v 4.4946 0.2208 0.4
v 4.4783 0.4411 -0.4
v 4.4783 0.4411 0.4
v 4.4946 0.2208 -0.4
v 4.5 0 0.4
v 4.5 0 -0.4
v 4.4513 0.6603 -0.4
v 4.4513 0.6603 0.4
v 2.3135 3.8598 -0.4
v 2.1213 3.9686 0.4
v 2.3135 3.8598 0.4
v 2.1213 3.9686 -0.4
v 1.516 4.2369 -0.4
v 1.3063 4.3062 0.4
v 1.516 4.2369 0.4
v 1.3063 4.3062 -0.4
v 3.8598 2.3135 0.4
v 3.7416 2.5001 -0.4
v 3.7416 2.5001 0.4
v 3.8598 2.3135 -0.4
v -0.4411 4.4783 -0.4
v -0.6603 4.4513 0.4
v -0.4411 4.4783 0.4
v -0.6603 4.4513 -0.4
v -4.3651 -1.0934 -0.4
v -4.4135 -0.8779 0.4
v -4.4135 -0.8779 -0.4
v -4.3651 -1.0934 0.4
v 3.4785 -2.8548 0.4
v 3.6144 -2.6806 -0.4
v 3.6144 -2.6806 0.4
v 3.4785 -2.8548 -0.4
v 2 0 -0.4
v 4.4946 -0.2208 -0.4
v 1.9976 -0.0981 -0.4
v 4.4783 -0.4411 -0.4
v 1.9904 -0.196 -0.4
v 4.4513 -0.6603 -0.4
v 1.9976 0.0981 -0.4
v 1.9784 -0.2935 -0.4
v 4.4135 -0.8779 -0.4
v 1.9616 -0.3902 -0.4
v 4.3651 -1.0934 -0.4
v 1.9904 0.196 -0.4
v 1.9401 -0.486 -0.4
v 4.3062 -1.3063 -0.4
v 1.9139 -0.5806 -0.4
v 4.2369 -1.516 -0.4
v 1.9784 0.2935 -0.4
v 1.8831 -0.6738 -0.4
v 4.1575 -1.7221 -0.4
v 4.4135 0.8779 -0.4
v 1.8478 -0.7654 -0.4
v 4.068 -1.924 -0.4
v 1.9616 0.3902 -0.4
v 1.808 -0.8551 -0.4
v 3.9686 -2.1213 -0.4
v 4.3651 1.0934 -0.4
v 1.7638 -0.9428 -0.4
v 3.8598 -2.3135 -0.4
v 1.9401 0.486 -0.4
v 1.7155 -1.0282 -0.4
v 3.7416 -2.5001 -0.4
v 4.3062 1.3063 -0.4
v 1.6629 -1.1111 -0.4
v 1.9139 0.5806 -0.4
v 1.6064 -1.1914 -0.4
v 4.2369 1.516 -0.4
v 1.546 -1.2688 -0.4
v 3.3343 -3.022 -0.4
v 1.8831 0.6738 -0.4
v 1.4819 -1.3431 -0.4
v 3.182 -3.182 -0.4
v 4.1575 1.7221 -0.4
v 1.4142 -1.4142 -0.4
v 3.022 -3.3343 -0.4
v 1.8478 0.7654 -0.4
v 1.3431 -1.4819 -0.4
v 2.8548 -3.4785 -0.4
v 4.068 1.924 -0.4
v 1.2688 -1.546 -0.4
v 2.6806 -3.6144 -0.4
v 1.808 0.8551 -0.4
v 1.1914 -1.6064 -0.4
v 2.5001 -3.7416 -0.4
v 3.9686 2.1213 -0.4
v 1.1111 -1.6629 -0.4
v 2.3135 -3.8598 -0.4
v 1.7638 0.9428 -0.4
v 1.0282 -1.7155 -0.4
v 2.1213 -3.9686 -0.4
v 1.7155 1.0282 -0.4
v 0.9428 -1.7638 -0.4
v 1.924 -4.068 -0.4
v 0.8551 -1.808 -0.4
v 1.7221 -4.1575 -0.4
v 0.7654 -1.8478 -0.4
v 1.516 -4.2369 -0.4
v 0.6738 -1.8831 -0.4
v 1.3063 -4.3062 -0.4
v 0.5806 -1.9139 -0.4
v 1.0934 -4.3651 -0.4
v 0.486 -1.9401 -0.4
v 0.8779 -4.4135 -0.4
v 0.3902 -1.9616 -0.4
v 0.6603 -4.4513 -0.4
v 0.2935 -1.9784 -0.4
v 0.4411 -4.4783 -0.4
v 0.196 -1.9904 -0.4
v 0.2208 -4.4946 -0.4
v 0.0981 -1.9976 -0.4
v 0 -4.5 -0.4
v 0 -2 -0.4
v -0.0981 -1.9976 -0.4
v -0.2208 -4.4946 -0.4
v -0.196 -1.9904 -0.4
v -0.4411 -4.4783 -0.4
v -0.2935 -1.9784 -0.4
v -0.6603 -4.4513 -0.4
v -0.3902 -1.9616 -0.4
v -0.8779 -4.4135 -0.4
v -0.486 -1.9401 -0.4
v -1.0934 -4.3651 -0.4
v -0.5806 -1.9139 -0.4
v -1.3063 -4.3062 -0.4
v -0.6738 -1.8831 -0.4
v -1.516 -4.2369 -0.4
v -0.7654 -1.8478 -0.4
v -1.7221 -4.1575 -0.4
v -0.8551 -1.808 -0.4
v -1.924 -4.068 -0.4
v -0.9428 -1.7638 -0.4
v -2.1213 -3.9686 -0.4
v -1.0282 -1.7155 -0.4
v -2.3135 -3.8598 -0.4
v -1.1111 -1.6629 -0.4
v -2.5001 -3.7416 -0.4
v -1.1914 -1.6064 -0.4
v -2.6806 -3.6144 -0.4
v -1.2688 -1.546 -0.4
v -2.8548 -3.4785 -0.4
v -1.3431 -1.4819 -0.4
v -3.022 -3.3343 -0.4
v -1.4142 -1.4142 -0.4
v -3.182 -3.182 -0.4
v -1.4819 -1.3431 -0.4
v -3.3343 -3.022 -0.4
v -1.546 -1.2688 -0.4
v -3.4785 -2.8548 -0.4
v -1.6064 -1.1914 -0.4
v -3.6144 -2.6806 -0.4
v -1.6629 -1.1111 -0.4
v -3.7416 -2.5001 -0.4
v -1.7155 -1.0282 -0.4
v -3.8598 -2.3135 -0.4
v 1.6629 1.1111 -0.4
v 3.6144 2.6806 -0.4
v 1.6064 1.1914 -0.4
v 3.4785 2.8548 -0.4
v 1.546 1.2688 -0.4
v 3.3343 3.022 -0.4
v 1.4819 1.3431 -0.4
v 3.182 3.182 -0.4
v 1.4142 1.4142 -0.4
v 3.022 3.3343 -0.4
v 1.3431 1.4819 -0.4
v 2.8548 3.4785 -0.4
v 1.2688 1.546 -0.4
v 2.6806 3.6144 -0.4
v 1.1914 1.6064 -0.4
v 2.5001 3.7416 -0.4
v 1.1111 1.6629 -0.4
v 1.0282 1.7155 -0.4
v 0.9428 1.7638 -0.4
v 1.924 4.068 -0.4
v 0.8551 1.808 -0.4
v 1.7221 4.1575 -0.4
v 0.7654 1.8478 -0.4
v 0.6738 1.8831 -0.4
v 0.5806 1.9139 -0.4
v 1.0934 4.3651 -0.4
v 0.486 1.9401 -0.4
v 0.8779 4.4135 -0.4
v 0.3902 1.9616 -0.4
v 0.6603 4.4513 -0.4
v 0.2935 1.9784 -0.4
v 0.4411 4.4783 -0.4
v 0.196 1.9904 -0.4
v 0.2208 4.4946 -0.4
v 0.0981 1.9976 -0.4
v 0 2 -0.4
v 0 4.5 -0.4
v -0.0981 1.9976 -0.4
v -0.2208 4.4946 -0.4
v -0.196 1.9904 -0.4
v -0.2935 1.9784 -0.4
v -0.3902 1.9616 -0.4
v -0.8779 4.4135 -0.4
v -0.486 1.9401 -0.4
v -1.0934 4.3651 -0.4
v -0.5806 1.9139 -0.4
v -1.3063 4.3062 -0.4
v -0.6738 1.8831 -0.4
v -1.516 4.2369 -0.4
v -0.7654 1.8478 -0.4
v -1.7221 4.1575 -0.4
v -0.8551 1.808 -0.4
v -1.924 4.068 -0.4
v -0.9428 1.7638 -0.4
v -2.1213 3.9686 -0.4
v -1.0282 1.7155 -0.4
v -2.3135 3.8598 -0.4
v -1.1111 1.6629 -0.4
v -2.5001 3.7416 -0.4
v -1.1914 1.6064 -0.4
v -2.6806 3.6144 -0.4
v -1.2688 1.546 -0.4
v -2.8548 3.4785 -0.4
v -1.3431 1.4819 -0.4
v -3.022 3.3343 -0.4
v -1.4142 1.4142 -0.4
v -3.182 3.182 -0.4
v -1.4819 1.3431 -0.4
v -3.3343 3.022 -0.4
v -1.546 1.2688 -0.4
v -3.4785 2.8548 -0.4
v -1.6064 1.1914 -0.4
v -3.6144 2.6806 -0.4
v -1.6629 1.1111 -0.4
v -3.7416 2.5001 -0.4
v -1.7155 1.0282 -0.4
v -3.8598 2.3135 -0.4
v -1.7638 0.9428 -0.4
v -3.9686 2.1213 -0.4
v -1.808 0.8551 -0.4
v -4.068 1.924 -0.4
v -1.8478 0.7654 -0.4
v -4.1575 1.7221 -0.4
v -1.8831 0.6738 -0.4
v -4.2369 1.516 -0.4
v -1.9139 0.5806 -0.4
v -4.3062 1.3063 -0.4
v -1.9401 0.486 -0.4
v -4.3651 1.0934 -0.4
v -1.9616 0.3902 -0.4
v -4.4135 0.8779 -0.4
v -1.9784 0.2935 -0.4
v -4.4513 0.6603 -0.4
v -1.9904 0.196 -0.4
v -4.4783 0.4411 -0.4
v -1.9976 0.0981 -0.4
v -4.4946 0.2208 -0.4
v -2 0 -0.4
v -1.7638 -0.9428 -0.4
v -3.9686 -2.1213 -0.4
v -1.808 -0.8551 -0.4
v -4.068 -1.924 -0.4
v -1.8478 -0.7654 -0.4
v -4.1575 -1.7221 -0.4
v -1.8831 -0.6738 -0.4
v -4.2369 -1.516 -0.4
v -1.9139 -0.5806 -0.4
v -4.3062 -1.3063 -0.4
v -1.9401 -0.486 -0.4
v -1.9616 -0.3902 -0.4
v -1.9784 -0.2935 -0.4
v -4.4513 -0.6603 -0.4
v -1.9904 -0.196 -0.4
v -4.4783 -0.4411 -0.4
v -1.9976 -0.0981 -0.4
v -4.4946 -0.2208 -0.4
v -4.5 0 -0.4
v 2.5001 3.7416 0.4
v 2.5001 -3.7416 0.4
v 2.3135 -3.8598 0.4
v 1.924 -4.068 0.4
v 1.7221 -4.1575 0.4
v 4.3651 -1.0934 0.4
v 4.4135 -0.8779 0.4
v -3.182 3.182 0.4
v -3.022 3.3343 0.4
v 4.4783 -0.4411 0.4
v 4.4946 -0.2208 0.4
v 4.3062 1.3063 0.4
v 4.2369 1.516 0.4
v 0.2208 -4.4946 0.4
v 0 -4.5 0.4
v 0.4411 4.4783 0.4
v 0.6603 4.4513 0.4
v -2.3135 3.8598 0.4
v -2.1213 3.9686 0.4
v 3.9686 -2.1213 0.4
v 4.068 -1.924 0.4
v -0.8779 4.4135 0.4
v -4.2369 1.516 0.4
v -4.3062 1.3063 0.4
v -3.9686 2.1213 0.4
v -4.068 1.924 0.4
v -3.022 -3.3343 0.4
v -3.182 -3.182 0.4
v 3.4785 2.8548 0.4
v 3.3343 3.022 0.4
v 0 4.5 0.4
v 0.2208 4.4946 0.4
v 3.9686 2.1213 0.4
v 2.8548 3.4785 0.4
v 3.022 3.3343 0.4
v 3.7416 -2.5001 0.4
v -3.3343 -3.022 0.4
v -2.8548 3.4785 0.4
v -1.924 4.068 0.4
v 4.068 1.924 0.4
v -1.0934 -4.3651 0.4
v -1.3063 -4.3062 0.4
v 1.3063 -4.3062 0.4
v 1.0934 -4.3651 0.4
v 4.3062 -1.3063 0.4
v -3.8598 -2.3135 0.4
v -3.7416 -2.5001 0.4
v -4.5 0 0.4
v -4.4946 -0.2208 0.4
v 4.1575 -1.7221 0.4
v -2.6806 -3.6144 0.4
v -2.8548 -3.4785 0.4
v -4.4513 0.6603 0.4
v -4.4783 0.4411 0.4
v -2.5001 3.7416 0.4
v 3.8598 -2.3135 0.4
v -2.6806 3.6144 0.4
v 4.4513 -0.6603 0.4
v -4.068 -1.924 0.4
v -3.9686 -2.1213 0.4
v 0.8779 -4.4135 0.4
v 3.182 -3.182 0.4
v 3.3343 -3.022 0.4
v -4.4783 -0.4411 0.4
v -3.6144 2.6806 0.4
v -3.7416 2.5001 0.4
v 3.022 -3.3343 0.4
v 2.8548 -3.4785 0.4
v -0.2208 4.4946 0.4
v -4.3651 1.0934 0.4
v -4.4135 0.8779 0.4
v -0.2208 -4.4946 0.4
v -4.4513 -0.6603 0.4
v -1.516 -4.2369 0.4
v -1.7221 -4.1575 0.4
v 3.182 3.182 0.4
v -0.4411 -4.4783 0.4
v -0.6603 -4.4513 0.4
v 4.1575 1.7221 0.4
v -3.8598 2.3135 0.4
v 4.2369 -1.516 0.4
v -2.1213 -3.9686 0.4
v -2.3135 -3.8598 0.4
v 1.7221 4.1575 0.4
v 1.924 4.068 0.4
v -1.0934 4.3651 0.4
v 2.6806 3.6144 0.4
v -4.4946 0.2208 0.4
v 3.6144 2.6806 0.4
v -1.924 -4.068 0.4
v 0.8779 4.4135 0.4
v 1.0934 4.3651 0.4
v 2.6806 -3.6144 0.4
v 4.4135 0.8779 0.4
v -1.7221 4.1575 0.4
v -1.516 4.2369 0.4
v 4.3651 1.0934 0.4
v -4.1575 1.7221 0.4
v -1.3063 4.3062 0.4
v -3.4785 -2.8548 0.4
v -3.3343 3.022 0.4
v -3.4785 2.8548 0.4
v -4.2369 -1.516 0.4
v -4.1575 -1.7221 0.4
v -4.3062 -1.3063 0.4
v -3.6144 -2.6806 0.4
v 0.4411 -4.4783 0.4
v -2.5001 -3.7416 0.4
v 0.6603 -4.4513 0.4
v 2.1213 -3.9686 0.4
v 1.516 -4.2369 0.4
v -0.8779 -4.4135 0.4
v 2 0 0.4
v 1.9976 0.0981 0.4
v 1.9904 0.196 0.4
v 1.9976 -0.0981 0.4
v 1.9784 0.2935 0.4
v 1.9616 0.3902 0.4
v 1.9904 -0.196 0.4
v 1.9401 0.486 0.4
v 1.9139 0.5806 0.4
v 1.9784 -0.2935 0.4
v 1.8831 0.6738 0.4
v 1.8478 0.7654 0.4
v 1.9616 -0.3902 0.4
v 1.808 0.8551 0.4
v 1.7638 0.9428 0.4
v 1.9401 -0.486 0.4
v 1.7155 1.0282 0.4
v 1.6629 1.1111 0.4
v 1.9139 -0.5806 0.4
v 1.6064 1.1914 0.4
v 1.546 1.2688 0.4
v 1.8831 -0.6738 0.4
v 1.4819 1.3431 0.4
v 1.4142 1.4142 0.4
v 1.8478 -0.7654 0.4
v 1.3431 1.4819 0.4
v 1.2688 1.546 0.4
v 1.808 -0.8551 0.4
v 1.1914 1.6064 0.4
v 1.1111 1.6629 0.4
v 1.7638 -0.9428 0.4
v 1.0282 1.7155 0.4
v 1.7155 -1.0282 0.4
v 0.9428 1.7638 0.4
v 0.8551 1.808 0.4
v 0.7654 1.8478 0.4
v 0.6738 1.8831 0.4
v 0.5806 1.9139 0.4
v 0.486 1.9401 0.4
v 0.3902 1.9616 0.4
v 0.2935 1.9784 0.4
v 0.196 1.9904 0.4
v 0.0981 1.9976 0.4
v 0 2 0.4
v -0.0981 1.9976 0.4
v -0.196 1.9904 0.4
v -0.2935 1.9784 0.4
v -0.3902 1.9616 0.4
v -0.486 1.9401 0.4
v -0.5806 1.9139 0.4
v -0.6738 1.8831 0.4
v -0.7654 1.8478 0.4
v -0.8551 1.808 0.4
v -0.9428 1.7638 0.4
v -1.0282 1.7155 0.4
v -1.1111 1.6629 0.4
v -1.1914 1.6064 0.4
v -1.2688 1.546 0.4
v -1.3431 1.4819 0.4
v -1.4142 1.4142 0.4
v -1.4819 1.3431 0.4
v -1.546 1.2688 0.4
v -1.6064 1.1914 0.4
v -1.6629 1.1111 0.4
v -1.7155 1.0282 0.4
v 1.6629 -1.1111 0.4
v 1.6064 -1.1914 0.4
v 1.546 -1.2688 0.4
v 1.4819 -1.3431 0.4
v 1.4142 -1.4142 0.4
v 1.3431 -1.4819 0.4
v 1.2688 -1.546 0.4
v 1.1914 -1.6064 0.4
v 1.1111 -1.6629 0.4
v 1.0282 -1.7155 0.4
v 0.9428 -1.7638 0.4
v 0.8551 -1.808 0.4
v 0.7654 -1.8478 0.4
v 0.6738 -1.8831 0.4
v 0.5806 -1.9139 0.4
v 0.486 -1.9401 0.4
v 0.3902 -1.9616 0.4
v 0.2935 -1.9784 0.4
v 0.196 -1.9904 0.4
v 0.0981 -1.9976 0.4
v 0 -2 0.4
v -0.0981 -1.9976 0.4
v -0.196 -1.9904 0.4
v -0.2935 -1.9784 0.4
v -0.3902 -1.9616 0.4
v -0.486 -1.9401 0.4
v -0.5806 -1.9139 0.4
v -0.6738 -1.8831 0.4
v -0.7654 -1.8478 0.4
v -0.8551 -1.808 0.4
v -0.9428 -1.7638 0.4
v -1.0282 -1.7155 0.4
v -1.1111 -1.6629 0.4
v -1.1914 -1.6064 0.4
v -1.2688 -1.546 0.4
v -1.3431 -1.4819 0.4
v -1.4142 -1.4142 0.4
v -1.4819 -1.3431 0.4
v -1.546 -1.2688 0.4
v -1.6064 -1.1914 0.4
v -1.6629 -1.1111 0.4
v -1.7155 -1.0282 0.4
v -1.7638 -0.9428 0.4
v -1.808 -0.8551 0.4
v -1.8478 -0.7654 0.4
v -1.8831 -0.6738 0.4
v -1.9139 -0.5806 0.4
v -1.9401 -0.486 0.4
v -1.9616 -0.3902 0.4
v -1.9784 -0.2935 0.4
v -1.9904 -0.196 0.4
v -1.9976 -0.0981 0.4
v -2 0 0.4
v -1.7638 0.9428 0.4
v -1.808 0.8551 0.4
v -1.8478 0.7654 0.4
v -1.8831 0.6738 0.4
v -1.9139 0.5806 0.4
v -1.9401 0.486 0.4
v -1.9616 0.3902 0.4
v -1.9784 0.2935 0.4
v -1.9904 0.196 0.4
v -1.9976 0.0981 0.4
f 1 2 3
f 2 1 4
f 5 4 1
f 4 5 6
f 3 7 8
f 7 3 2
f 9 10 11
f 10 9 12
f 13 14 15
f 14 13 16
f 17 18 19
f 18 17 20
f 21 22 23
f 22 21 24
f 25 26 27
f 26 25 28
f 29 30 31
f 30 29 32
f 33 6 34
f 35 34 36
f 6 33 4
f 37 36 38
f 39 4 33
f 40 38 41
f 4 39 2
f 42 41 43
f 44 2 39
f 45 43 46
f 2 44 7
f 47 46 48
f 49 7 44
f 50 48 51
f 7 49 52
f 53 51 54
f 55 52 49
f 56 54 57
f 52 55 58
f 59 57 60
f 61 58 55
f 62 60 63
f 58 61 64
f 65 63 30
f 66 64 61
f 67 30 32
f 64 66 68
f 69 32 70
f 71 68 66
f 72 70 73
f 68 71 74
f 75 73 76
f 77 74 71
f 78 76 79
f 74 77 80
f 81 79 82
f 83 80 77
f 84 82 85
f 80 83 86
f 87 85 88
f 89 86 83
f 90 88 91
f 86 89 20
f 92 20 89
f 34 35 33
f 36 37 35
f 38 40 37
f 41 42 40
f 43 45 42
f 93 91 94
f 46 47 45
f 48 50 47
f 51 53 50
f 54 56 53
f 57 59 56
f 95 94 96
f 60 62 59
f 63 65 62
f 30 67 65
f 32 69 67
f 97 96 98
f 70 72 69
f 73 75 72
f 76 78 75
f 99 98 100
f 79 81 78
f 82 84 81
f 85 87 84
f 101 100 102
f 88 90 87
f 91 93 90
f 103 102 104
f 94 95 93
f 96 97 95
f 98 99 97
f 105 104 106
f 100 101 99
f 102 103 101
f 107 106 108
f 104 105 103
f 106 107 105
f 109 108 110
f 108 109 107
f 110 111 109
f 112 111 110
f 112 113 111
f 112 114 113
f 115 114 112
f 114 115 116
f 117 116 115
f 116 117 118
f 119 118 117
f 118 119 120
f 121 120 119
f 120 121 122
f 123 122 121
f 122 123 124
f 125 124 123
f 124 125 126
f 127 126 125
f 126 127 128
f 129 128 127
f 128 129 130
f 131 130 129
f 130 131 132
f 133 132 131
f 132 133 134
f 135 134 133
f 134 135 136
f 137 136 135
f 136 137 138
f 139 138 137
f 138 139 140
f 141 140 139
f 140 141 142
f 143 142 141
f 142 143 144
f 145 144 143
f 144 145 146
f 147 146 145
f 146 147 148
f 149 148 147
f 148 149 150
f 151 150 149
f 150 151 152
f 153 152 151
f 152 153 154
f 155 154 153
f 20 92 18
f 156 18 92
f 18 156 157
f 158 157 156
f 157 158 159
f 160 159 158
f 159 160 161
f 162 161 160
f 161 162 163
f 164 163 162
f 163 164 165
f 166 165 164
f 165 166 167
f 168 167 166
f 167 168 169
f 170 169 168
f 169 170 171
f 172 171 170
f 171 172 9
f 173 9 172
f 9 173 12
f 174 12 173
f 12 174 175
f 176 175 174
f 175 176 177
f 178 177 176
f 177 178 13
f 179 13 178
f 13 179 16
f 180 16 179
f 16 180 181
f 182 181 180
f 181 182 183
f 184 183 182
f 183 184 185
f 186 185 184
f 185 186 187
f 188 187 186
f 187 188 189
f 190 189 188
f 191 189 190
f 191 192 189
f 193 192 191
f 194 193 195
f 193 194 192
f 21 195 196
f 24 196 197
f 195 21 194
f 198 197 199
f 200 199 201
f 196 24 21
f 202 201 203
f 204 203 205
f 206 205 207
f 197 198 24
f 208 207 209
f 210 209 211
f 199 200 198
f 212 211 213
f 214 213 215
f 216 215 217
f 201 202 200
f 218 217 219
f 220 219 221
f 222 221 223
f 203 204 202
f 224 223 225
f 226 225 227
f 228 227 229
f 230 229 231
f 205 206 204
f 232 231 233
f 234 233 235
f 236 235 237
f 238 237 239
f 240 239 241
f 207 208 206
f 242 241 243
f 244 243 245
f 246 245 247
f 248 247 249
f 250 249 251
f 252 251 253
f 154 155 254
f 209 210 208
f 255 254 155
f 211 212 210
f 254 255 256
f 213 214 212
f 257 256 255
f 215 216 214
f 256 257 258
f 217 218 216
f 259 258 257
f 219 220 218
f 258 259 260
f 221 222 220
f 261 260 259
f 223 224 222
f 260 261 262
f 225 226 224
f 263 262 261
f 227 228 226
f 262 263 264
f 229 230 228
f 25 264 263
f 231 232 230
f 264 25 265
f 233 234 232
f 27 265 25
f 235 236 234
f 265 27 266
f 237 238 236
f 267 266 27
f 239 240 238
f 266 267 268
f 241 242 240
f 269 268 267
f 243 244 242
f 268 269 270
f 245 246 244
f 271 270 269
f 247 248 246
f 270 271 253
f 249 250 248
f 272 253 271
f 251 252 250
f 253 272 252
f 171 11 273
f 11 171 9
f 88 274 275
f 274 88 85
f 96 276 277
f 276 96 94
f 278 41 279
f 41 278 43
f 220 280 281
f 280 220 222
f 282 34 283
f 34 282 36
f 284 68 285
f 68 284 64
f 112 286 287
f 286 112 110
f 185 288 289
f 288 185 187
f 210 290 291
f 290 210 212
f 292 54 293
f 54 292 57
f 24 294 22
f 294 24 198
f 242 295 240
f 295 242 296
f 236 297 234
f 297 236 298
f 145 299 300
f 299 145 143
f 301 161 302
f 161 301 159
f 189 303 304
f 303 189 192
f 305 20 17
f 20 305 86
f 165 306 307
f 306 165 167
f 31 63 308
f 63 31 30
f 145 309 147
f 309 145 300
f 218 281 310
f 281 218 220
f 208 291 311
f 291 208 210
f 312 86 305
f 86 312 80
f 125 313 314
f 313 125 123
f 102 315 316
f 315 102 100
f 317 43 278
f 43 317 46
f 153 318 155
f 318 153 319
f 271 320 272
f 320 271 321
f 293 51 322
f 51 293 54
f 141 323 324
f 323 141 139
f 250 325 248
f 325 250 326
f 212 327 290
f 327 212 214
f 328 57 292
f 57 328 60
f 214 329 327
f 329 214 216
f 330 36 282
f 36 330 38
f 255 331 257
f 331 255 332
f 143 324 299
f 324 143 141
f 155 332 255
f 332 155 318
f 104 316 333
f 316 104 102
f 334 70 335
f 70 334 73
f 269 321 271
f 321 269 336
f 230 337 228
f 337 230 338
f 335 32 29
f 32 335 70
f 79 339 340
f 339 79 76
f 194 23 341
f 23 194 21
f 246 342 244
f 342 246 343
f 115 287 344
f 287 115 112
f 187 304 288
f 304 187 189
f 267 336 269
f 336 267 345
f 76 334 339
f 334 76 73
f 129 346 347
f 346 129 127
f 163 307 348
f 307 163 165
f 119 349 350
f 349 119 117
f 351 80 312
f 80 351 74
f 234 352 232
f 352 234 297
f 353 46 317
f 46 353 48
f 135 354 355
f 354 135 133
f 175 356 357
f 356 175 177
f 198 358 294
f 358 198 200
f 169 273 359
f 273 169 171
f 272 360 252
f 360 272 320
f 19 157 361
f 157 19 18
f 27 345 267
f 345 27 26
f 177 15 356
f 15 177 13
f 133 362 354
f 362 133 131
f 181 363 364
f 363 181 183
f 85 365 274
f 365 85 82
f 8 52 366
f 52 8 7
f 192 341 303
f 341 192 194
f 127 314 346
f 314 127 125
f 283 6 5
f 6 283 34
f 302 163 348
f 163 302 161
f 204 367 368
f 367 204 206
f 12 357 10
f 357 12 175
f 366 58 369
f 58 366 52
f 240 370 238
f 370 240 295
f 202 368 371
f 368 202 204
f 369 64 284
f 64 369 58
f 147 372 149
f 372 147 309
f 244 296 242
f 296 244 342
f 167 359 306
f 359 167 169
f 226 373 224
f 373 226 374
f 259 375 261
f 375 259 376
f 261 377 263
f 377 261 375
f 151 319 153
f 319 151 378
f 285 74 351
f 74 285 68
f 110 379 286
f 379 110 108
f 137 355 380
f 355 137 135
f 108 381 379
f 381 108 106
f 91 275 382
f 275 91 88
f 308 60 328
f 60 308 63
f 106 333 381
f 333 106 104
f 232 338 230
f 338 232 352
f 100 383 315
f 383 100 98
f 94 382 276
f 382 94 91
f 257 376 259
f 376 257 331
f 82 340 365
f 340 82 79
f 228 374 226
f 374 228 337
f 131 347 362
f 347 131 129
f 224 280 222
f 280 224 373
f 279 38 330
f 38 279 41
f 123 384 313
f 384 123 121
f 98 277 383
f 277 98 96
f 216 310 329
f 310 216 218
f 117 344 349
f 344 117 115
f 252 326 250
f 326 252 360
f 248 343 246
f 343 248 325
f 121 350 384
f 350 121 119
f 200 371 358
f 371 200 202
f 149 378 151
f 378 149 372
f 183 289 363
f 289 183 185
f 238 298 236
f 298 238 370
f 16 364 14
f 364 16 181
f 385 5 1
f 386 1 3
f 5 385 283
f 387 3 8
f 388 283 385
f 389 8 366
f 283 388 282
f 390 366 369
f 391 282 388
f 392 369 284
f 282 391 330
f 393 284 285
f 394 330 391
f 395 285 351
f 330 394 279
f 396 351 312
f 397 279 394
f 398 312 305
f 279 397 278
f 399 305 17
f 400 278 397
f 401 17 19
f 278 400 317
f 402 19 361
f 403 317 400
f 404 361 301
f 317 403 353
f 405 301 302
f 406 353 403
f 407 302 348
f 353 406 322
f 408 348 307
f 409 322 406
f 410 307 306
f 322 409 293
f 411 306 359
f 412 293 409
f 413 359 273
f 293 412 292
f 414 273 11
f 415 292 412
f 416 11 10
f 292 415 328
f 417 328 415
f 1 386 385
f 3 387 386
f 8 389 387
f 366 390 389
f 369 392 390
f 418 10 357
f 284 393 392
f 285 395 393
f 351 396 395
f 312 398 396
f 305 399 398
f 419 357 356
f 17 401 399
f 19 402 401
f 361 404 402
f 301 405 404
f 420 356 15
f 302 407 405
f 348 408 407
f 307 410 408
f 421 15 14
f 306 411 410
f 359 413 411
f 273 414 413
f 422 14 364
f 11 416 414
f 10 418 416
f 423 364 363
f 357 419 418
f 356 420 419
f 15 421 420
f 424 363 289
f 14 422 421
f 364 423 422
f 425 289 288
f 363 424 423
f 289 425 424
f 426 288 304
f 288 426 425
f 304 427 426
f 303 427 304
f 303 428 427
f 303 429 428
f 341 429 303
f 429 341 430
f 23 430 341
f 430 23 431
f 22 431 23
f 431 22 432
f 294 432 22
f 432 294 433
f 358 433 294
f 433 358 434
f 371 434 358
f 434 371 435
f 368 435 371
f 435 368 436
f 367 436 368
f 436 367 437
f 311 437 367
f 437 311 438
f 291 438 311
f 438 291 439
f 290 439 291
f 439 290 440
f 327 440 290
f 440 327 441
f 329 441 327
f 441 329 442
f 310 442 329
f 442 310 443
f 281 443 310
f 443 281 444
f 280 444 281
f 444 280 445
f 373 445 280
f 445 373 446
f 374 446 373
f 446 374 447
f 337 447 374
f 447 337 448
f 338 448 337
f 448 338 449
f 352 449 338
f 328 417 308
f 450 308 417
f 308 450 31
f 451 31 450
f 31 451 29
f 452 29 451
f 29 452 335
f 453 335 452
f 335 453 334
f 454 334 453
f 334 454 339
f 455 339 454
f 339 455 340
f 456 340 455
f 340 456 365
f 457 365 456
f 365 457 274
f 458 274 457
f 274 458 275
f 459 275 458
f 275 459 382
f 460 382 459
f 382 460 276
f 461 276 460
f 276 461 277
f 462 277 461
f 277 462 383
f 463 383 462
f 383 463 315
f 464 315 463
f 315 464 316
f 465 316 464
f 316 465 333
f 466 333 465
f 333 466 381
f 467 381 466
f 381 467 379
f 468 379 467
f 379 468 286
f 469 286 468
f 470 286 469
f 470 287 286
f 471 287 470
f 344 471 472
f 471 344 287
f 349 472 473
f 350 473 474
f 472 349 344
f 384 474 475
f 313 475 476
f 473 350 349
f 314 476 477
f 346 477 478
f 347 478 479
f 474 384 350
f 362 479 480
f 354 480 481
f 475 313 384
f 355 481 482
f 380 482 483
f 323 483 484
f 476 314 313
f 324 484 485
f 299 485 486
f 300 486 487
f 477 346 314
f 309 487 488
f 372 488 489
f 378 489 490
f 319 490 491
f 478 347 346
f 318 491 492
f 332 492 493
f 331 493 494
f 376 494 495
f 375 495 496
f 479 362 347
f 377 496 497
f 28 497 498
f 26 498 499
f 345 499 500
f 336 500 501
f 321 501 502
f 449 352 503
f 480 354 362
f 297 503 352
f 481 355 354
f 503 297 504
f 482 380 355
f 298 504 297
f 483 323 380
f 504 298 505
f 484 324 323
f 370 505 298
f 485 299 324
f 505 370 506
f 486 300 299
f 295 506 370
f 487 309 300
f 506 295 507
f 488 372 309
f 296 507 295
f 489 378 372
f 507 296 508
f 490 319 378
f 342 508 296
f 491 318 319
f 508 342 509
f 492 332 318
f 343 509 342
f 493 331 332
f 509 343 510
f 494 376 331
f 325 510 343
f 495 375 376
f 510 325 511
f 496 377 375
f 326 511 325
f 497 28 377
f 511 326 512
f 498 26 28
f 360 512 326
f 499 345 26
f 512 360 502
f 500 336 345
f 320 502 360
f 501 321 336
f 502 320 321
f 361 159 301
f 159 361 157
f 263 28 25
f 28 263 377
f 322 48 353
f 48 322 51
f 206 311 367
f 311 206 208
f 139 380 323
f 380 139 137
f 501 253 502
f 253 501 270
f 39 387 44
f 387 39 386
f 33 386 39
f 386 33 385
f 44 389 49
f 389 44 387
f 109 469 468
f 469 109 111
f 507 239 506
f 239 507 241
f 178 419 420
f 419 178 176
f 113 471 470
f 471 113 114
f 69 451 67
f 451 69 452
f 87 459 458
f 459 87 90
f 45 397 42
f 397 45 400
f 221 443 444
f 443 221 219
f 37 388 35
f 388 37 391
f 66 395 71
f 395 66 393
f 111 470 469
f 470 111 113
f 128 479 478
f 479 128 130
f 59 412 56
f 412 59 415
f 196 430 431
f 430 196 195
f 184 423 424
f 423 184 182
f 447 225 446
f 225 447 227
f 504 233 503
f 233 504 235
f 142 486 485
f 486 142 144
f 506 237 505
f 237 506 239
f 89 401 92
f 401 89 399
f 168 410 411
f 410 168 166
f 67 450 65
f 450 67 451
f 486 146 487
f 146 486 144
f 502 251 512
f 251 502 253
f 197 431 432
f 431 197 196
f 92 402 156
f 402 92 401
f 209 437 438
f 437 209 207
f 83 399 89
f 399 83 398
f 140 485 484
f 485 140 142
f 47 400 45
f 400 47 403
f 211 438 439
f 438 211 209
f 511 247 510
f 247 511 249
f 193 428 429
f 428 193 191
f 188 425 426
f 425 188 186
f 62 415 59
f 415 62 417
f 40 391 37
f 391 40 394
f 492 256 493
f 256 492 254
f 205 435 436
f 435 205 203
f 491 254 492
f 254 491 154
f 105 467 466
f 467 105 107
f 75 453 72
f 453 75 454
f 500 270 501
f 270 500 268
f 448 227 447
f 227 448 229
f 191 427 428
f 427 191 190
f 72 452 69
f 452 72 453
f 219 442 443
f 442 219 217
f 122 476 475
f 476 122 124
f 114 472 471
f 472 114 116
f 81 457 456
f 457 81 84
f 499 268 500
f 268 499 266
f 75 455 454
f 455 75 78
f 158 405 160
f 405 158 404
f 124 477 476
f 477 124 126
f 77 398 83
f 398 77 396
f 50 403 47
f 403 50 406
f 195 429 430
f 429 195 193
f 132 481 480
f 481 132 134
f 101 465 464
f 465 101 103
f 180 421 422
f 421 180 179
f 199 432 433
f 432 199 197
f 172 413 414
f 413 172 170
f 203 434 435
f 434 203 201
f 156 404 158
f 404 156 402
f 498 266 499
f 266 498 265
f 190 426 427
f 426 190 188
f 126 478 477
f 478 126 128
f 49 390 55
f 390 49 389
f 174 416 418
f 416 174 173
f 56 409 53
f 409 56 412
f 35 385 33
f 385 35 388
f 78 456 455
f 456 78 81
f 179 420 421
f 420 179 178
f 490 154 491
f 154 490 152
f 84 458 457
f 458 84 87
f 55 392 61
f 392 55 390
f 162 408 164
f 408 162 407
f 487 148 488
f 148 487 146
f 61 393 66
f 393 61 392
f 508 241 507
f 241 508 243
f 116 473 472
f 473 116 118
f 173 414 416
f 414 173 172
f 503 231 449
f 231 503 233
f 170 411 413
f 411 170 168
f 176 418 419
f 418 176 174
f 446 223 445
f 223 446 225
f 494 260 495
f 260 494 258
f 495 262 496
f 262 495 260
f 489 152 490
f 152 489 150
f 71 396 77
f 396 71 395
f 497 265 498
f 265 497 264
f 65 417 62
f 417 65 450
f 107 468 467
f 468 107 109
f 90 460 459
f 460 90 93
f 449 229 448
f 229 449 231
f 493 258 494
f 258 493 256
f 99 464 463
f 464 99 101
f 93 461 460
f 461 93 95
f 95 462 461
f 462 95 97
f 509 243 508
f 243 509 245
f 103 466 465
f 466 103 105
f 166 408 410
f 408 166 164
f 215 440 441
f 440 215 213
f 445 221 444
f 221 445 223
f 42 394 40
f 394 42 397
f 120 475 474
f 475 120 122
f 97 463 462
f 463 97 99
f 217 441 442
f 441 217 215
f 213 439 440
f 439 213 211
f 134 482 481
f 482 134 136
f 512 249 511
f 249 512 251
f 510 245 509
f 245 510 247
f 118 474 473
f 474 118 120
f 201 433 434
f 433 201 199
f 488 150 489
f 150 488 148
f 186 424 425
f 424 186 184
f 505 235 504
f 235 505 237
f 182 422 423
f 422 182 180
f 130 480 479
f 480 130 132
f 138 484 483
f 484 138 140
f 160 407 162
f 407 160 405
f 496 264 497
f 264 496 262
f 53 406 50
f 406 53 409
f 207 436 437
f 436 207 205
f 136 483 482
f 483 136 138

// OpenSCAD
$fn=128;

module washer(id=4.0, od=9.0, thickness=0.8) {
    difference() {
        cylinder(h=thickness, d=od, center=true);
        cylinder(h=thickness + 0.2, d=id, center=true);
    }
}

washer(id=4.0, od=9.0, thickness=0.8);
